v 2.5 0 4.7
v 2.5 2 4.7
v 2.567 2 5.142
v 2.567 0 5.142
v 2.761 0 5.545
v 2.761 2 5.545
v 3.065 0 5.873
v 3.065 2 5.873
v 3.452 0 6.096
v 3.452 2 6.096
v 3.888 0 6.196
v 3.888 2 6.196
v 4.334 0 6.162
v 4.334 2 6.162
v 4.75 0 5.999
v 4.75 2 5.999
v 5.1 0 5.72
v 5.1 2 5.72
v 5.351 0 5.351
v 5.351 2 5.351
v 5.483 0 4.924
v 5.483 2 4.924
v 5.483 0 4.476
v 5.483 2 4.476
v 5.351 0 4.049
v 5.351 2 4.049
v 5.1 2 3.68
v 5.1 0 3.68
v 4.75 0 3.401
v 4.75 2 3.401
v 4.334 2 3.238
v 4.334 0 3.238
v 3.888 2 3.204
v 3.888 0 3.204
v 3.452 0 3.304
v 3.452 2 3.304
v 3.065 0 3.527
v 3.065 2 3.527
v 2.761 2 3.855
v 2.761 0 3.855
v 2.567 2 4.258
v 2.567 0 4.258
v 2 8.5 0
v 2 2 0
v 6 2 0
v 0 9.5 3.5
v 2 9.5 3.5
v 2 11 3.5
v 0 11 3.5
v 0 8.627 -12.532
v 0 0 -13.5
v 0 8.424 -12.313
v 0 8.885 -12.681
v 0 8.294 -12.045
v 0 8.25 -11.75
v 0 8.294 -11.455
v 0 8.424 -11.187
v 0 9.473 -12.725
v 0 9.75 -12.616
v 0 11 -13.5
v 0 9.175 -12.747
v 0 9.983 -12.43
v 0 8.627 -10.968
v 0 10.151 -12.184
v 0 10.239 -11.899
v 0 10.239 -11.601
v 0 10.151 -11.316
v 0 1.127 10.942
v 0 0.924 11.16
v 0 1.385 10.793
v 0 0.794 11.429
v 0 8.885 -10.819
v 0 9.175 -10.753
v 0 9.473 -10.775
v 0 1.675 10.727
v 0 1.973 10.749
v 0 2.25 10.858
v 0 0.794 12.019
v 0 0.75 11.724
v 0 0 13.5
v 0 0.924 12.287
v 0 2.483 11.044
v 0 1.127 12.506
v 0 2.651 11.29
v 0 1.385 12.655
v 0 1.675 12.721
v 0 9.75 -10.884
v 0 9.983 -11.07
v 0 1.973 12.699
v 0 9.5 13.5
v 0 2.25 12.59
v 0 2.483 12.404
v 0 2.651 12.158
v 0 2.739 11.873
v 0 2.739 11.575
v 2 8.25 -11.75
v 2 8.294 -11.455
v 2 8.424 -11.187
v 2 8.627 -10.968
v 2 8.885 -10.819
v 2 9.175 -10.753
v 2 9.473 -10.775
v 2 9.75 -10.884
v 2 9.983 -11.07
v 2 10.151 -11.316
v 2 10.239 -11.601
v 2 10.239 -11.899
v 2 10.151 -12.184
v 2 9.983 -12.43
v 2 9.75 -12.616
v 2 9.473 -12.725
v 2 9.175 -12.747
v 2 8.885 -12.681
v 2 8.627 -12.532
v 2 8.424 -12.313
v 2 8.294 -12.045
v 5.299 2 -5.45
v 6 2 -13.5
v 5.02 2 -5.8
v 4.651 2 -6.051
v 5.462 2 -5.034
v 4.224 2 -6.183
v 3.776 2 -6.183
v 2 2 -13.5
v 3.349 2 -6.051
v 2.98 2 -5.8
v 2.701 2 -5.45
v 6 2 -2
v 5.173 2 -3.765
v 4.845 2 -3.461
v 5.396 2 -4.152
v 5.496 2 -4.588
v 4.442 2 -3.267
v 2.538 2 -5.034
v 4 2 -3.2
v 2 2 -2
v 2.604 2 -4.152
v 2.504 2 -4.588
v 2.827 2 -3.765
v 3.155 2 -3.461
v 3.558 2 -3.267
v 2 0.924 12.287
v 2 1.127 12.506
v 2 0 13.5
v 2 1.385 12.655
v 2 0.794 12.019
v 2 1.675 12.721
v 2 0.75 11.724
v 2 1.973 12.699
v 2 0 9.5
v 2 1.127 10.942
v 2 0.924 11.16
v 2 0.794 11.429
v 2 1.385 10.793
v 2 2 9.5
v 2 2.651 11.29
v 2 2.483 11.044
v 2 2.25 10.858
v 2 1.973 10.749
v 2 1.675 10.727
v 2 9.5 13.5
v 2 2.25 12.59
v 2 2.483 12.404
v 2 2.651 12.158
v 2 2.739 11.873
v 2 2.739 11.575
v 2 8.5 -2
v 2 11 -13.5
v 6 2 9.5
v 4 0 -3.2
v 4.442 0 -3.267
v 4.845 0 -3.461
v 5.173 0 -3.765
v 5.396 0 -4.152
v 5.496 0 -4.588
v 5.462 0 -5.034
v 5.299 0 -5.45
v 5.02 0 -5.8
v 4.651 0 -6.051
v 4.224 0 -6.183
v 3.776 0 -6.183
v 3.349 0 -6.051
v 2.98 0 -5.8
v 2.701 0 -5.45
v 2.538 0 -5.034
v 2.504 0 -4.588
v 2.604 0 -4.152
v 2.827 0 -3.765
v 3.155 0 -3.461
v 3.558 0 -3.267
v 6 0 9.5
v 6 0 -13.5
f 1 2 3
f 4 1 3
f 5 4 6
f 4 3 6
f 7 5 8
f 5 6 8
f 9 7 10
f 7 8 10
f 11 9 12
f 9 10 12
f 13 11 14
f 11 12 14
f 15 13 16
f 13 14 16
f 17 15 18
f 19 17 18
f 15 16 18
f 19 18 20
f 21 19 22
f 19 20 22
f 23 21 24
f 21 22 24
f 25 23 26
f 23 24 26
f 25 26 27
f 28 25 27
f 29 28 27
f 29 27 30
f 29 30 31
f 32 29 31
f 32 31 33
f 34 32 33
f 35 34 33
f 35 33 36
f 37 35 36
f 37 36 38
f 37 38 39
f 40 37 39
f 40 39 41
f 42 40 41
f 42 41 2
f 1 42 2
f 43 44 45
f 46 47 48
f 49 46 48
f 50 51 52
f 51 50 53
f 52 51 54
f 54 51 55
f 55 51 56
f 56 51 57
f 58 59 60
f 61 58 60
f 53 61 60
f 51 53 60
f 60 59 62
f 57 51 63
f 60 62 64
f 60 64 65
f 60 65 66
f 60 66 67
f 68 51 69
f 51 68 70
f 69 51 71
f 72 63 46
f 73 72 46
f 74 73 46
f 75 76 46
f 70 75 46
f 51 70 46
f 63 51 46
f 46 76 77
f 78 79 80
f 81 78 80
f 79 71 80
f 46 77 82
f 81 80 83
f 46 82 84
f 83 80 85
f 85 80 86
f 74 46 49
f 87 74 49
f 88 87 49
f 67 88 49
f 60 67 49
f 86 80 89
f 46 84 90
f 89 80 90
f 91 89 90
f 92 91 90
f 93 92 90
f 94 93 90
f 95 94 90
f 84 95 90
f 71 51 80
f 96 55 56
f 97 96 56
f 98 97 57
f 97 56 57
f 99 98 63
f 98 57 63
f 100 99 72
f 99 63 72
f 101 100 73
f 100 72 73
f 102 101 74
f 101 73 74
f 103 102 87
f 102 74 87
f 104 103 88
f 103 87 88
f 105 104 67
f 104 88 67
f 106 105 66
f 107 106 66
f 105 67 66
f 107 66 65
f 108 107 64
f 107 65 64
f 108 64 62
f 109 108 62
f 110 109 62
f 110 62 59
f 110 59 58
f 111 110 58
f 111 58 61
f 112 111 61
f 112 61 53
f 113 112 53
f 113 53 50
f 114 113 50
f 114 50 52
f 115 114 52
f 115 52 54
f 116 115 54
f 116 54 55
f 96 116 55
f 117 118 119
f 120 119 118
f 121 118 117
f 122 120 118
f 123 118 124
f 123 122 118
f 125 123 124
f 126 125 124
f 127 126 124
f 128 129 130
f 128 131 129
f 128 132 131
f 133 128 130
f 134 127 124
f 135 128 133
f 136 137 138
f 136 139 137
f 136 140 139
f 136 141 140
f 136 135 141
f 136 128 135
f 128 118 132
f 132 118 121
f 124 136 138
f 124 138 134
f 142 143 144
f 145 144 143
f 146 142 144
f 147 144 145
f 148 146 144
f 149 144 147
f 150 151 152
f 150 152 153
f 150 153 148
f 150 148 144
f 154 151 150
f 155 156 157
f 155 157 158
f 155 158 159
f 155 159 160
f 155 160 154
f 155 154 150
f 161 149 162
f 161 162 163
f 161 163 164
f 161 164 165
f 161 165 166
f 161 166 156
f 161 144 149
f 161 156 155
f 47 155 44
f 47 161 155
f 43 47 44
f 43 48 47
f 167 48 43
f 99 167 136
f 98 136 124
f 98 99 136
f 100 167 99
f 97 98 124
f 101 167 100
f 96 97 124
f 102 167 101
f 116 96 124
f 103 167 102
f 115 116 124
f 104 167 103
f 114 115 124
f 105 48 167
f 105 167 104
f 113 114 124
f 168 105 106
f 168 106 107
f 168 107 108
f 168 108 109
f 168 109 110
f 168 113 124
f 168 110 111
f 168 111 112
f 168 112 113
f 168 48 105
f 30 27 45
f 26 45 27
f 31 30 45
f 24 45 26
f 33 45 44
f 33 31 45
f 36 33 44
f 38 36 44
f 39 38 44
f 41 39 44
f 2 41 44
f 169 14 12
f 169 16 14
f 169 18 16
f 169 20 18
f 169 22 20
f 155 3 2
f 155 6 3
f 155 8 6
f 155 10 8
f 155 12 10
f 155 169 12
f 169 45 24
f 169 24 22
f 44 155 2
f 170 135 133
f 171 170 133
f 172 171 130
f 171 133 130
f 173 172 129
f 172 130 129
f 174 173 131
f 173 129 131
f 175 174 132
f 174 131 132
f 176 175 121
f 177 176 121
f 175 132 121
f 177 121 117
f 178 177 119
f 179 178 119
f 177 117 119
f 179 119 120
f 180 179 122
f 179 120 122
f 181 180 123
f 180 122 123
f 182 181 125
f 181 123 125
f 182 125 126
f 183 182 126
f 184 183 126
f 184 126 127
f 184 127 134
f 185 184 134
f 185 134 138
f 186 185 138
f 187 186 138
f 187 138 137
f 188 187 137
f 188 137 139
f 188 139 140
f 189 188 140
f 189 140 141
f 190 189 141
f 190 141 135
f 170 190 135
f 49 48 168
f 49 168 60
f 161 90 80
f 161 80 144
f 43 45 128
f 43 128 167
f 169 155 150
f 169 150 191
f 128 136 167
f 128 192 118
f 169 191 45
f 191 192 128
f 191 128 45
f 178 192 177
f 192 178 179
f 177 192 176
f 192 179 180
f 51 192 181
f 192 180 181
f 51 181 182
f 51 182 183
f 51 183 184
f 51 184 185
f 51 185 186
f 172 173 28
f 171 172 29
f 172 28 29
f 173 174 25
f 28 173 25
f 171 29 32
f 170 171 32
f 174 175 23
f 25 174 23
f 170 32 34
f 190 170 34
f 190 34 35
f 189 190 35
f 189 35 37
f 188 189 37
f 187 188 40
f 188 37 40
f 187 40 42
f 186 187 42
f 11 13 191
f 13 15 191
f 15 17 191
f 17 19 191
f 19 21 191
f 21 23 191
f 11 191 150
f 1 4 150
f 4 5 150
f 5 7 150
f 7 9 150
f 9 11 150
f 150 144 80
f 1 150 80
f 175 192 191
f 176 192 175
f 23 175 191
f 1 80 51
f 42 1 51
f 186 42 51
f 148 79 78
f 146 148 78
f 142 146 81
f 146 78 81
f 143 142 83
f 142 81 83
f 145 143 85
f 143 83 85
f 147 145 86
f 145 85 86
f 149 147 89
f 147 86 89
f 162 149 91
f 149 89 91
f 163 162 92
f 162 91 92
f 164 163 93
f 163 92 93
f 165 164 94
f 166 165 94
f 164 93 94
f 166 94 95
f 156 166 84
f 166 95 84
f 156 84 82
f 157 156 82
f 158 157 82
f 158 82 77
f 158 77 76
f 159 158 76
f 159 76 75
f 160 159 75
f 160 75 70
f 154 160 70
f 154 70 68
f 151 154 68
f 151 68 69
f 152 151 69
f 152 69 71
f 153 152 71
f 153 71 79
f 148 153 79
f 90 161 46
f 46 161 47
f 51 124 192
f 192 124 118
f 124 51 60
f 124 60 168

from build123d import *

# Parameters (mm, degrees)
BOSS_EXTRUDE1_DEPTH = 13.5
SKETCH2_W           = 10
SKETCH2_H           = 1.5
CUT_EXTRUDE1_DEPTH  = 27
SKETCH3_R           = 1
CUT_EXTRUDE2_DEPTH  = 3.6
SKETCH6_W           = 6
SKETCH6_H           = 2
BOSS_EXTRUDE2_DEPTH = 3
SKETCH7_R           = 1.5
CUT_EXTRUDE5_DEPTH  = 9
BOSS_EXTRUDE3_DEPTH = 2
SKETCH10_W          = 6
SKETCH10_H          = 3
CUT_EXTRUDE6_DEPTH  = 10
SKETCH11_W          = 4
SKETCH11_H          = 4
CUT_EXTRUDE7_DEPTH  = 10


with BuildPart() as part:
    # Sketch1 → Boss-Extrude1 (new, symmetric)
    with BuildSketch(Plane.XY):
        Polygon((0, 11), (0, 0), (6, 0), (6, 2), (2, 2), (2, 11), align=None)
    extrude(amount=BOSS_EXTRUDE1_DEPTH, both=True)

    # Sketch2 → Cut-Extrude1 (cut)
    with BuildSketch(Plane(origin=(2, 0, 0), x_dir=(0, 0, -1), z_dir=(1, 0, 0))):
        with Locations((-8.5, 10.25)):
            Rectangle(SKETCH2_W, SKETCH2_H)
    extrude(amount=-CUT_EXTRUDE1_DEPTH, mode=Mode.SUBTRACT)

    # Sketch3 → Cut-Extrude2 (cut)
    with BuildSketch(Plane.ZY):
        with Locations(Location((-11.75, 9.25, 0), (0, 0, 270))):
            Circle(SKETCH3_R)
        with Locations(Location((11.723777669, 1.75, 0), (0, 0, 270))):
            Circle(SKETCH3_R)
    extrude(amount=-CUT_EXTRUDE2_DEPTH, mode=Mode.SUBTRACT)

    # Sketch6 → Boss-Extrude2 (add)
    with BuildSketch(Plane(origin=(0, 0, -13.5), x_dir=(-1, 0, 0), z_dir=(0, 0, -1))):
        with Locations((-3, 1)):
            Rectangle(SKETCH6_W, SKETCH6_H)
    extrude(amount=BOSS_EXTRUDE2_DEPTH)

    # Sketch7 → Cut-Extrude5 (cut)
    with BuildSketch(Plane(origin=(0, 2, 0), x_dir=(1, 0, 0), z_dir=(0, 1, 0))):
        with Locations(Location((4, -4.7, 0), (0, 0, 180))):
            Circle(SKETCH7_R)
        with Locations(Location((4, 4.7, 0), (0, 0, 270))):
            Circle(SKETCH7_R)
    extrude(amount=-CUT_EXTRUDE5_DEPTH, mode=Mode.SUBTRACT)

    # Sketch9 → Boss-Extrude3 (add)
    with BuildSketch(Plane.XY):
        Polygon((2, 8.5), (2, 2), (6, 2), align=None)
    extrude(amount=-BOSS_EXTRUDE3_DEPTH)

    # Sketch10 → Cut-Extrude6 (cut)
    with BuildSketch(Plane(origin=(0, 2, 0), x_dir=(1, 0, 0), z_dir=(0, 1, 0))):
        with Locations((3, 15)):
            Rectangle(SKETCH10_W, SKETCH10_H)
    extrude(amount=-CUT_EXTRUDE6_DEPTH, mode=Mode.SUBTRACT)

    # Sketch11 → Cut-Extrude7 (cut)
    with BuildSketch(Plane(origin=(0, 2, 0), x_dir=(1, 0, 0), z_dir=(0, 1, 0))):
        with Locations((4, -11.5)):
            Rectangle(SKETCH11_W, SKETCH11_H)
    extrude(amount=-CUT_EXTRUDE7_DEPTH, mode=Mode.SUBTRACT)


solid = part.part
